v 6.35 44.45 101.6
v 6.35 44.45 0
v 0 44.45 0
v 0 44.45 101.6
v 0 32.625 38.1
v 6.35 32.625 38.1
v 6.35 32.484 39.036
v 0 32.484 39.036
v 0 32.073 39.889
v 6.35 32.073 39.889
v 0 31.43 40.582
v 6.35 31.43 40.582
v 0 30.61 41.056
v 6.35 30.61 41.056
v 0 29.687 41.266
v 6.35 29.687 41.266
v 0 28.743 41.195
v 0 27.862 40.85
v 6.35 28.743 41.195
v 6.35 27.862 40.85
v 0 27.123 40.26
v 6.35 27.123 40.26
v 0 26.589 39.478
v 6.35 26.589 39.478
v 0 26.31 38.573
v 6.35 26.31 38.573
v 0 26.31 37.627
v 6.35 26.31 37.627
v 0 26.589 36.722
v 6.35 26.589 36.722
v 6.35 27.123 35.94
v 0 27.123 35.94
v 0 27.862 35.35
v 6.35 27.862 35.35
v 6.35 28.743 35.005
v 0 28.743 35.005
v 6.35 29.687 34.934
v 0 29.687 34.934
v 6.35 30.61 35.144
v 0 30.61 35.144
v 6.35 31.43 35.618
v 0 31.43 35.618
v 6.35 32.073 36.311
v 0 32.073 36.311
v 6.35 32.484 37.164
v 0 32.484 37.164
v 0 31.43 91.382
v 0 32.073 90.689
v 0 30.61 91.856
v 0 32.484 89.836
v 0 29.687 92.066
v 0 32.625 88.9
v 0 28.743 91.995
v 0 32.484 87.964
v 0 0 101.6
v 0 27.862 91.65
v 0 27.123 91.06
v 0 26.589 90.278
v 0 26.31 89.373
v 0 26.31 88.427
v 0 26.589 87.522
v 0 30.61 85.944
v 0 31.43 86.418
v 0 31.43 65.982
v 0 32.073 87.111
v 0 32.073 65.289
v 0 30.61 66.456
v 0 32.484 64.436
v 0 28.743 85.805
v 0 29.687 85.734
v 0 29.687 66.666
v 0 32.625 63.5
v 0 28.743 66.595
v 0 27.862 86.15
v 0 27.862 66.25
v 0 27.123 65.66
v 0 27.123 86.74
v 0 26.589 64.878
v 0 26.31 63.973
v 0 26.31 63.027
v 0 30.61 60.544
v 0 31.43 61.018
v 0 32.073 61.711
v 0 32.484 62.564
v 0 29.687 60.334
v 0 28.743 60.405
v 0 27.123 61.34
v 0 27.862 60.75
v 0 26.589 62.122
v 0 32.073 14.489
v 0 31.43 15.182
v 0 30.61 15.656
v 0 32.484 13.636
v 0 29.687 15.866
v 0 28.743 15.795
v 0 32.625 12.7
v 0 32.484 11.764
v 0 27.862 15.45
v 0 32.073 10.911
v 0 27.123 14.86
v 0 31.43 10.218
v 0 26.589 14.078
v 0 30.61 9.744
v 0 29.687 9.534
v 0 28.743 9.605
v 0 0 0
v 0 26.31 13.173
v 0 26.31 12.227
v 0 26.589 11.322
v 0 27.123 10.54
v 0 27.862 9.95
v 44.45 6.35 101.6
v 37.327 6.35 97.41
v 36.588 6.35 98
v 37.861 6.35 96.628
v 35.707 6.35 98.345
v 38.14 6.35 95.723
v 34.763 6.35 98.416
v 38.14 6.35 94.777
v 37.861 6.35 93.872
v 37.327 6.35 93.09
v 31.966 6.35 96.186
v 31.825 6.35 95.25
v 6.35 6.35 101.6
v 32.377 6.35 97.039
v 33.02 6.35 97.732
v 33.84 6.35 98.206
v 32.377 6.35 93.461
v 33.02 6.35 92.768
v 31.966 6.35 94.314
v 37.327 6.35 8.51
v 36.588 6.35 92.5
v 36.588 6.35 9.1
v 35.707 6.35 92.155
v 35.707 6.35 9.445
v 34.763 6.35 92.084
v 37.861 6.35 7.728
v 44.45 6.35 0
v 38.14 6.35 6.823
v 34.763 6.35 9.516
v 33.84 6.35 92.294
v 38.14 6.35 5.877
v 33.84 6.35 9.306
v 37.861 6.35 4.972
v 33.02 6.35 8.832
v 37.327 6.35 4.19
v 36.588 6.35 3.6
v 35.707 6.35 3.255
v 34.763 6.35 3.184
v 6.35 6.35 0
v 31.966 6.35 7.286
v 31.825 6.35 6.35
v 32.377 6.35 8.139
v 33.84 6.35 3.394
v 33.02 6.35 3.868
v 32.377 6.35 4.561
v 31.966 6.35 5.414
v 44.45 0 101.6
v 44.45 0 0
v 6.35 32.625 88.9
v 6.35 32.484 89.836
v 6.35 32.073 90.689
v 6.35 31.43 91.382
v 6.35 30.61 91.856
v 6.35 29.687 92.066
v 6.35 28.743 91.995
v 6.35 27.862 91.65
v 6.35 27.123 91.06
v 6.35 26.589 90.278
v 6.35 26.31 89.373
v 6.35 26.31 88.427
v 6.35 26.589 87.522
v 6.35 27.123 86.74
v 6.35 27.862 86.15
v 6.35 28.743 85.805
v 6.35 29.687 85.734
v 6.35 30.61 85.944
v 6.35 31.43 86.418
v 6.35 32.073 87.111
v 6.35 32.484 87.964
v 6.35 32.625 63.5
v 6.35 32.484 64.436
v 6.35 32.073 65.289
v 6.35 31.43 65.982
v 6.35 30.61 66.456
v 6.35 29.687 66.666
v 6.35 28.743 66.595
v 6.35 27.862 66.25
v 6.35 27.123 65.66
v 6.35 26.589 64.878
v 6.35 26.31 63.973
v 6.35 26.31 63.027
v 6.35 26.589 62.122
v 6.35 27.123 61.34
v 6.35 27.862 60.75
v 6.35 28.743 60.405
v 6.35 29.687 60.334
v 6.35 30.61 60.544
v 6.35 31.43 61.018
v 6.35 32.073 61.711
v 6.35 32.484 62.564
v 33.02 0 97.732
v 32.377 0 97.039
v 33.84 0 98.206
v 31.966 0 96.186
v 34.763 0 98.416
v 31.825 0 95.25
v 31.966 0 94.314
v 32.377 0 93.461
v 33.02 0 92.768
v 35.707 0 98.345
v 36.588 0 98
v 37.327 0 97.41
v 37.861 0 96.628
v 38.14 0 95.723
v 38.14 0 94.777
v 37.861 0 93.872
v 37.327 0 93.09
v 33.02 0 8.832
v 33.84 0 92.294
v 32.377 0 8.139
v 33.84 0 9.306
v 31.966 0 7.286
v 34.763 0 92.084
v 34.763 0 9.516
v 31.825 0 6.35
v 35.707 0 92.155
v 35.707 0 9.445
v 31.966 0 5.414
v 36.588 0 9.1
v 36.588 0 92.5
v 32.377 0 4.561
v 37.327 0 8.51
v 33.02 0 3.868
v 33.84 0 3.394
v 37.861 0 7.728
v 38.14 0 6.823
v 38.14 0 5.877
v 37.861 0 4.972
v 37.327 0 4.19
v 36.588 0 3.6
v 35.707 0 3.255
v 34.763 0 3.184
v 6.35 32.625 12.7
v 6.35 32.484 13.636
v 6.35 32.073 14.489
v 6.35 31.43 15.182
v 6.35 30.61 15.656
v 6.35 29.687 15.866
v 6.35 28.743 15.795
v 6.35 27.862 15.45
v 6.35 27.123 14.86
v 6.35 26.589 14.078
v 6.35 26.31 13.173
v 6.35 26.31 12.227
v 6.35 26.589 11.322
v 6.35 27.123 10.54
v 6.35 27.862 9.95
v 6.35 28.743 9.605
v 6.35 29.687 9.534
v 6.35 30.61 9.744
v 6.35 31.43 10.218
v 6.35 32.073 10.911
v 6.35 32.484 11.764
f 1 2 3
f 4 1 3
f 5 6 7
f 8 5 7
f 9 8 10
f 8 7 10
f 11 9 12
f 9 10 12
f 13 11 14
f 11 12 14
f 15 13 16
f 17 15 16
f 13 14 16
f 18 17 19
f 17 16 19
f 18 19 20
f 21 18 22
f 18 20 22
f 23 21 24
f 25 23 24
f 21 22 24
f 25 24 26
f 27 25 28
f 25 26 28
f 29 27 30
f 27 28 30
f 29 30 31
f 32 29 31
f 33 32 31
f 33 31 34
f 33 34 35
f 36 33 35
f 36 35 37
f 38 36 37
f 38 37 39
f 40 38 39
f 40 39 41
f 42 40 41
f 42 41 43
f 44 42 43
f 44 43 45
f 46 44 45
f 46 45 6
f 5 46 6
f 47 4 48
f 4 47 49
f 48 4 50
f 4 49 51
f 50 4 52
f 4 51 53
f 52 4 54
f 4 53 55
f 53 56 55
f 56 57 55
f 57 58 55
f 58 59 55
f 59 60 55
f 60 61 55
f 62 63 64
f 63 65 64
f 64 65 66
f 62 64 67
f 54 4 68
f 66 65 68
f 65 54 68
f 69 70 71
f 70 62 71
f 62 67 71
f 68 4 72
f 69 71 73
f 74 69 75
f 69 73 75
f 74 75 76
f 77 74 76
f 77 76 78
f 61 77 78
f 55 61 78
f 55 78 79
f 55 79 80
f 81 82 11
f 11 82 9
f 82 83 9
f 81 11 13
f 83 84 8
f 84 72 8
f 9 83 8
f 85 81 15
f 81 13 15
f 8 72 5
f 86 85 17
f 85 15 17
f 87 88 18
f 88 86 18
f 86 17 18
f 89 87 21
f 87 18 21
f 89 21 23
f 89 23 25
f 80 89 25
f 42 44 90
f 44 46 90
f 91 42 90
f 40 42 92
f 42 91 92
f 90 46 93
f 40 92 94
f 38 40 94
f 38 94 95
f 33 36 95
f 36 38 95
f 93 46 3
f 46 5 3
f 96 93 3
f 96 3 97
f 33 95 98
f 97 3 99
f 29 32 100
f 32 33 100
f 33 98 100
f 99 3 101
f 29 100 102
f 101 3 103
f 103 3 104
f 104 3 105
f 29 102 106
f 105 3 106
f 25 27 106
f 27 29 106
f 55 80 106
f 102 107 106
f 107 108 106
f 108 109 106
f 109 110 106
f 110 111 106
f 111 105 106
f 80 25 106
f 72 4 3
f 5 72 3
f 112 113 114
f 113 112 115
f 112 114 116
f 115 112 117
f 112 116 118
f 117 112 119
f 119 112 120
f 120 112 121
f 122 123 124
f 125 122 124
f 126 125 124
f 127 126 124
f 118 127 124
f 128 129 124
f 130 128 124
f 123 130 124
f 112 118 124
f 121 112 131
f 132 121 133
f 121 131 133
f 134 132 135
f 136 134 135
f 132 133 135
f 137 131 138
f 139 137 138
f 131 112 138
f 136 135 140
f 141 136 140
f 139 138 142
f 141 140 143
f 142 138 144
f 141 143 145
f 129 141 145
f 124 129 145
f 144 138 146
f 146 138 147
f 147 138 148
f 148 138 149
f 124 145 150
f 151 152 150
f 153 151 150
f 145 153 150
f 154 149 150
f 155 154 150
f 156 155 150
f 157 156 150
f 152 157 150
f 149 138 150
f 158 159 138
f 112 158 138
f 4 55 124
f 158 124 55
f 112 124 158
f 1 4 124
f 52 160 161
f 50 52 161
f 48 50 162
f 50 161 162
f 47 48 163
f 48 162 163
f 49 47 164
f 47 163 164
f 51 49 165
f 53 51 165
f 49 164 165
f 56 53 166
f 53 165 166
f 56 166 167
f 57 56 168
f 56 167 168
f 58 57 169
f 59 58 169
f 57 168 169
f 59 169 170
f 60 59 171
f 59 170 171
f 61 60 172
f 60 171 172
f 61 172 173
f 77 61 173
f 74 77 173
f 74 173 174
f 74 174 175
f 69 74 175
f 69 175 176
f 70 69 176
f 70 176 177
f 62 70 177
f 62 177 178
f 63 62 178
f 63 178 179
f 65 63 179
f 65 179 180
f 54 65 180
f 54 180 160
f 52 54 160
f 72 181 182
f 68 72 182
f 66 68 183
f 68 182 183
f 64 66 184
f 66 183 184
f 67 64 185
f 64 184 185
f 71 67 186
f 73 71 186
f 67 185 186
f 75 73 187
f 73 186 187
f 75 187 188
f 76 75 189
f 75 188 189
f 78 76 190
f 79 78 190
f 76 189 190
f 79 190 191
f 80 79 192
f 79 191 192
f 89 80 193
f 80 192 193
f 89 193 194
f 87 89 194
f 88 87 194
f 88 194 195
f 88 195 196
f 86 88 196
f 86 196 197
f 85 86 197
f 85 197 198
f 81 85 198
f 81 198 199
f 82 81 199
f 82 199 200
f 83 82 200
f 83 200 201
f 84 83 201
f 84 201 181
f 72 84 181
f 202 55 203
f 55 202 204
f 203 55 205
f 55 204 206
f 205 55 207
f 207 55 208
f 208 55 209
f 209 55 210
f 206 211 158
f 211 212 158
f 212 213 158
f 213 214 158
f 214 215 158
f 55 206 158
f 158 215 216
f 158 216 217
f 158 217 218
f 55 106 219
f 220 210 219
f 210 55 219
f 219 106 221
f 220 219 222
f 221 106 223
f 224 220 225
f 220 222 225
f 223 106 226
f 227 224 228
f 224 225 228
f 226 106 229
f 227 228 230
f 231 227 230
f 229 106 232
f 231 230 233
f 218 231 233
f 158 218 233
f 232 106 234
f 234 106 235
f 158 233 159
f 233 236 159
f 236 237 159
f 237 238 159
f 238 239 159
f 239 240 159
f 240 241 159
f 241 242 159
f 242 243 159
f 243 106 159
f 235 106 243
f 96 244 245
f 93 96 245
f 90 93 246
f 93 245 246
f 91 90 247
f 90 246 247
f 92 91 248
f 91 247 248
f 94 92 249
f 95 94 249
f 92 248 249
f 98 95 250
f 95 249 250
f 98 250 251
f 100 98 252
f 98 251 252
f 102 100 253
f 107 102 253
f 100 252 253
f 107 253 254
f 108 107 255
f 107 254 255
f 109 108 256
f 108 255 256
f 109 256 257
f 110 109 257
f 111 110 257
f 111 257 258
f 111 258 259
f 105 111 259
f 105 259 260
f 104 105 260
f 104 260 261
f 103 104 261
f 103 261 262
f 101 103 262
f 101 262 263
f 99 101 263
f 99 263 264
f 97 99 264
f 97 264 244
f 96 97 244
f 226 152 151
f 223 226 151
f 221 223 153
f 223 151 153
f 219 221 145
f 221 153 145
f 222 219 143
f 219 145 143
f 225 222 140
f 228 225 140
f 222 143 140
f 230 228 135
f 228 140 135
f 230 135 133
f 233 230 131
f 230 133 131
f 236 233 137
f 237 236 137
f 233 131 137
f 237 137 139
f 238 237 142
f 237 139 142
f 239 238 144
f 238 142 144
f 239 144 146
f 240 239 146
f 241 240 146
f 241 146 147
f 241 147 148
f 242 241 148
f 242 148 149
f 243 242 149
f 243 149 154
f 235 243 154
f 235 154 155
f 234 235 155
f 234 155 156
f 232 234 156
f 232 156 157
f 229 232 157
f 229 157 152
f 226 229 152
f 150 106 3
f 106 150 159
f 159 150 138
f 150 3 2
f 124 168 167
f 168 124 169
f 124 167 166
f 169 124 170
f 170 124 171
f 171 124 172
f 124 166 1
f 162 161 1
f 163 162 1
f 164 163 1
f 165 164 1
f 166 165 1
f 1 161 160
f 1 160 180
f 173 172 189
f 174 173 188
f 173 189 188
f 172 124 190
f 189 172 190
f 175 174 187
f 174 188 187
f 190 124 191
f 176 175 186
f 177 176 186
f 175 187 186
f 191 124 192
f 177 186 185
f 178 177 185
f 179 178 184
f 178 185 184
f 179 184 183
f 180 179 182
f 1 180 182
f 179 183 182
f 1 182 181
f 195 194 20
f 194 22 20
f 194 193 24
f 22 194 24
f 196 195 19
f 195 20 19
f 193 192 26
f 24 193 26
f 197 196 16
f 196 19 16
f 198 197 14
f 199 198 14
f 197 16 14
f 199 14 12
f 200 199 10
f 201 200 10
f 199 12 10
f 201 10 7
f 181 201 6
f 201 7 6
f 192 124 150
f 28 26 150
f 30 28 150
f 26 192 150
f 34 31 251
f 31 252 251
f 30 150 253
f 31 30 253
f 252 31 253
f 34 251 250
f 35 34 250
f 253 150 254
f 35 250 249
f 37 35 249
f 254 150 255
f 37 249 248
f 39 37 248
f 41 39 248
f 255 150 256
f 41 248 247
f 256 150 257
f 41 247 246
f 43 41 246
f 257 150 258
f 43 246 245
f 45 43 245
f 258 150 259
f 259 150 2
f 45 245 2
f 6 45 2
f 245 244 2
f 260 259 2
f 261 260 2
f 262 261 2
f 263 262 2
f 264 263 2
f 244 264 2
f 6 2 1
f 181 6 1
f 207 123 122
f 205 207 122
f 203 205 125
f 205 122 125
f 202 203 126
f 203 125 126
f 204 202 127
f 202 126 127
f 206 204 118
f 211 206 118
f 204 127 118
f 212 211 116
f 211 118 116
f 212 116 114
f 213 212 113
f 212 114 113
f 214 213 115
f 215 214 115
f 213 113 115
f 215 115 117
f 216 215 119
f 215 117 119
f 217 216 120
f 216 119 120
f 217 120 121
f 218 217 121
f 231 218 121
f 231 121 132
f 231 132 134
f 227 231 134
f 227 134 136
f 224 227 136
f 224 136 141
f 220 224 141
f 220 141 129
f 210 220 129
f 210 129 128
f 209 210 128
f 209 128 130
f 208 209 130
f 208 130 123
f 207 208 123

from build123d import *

# Parameters (mm, degrees)
BOSS_EXTRUDE1_DEPTH = 101.6
SKETCH2_R           = 3.175
CUT_EXTRUDE1_DEPTH  = 25.146
SKETCH3_R           = 3.175
CUT_EXTRUDE2_DEPTH  = 25.146


with BuildPart() as part:
    # Sketch1 → Boss-Extrude1 (new body)
    with BuildSketch(Plane.XY):
        Polygon((0, 44.45), (0, 0), (44.45, 0), (44.45, 6.35), (6.35, 6.35), (6.35, 44.45), align=None)
    extrude(amount=BOSS_EXTRUDE1_DEPTH)

    # Sketch2 → Cut-Extrude1 (cut)
    with BuildSketch(Plane(origin=(0, 6.35, 0), x_dir=(1, 0, 0), z_dir=(0, 1, 0))):
        with Locations(Location((35, -95.25, 0), (0, 0, 180))):
            Circle(SKETCH2_R)
        with Locations(Location((35, -6.35, 0), (0, 0, 180))):
            Circle(SKETCH2_R)
    extrude(amount=-CUT_EXTRUDE1_DEPTH, mode=Mode.SUBTRACT)

    # Sketch3 → Cut-Extrude2 (cut)
    with BuildSketch(Plane(origin=(6.35, 0, 0), x_dir=(0, 0, -1), z_dir=(1, 0, 0))):
        with Locations(Location((-12.7, 29.45, 0), (0, 0, 90))):
            Circle(SKETCH3_R)
        with Locations(Location((-63.5, 29.45, 0), (0, 0, 90))):
            Circle(SKETCH3_R)
        with Locations(Location((-88.9, 29.45, 0), (0, 0, 90))):
            Circle(SKETCH3_R)
        with Locations(Location((-38.1, 29.45, 0), (0, 0, 90))):
            Circle(SKETCH3_R)
    extrude(amount=-CUT_EXTRUDE2_DEPTH, mode=Mode.SUBTRACT)


solid = part.part
